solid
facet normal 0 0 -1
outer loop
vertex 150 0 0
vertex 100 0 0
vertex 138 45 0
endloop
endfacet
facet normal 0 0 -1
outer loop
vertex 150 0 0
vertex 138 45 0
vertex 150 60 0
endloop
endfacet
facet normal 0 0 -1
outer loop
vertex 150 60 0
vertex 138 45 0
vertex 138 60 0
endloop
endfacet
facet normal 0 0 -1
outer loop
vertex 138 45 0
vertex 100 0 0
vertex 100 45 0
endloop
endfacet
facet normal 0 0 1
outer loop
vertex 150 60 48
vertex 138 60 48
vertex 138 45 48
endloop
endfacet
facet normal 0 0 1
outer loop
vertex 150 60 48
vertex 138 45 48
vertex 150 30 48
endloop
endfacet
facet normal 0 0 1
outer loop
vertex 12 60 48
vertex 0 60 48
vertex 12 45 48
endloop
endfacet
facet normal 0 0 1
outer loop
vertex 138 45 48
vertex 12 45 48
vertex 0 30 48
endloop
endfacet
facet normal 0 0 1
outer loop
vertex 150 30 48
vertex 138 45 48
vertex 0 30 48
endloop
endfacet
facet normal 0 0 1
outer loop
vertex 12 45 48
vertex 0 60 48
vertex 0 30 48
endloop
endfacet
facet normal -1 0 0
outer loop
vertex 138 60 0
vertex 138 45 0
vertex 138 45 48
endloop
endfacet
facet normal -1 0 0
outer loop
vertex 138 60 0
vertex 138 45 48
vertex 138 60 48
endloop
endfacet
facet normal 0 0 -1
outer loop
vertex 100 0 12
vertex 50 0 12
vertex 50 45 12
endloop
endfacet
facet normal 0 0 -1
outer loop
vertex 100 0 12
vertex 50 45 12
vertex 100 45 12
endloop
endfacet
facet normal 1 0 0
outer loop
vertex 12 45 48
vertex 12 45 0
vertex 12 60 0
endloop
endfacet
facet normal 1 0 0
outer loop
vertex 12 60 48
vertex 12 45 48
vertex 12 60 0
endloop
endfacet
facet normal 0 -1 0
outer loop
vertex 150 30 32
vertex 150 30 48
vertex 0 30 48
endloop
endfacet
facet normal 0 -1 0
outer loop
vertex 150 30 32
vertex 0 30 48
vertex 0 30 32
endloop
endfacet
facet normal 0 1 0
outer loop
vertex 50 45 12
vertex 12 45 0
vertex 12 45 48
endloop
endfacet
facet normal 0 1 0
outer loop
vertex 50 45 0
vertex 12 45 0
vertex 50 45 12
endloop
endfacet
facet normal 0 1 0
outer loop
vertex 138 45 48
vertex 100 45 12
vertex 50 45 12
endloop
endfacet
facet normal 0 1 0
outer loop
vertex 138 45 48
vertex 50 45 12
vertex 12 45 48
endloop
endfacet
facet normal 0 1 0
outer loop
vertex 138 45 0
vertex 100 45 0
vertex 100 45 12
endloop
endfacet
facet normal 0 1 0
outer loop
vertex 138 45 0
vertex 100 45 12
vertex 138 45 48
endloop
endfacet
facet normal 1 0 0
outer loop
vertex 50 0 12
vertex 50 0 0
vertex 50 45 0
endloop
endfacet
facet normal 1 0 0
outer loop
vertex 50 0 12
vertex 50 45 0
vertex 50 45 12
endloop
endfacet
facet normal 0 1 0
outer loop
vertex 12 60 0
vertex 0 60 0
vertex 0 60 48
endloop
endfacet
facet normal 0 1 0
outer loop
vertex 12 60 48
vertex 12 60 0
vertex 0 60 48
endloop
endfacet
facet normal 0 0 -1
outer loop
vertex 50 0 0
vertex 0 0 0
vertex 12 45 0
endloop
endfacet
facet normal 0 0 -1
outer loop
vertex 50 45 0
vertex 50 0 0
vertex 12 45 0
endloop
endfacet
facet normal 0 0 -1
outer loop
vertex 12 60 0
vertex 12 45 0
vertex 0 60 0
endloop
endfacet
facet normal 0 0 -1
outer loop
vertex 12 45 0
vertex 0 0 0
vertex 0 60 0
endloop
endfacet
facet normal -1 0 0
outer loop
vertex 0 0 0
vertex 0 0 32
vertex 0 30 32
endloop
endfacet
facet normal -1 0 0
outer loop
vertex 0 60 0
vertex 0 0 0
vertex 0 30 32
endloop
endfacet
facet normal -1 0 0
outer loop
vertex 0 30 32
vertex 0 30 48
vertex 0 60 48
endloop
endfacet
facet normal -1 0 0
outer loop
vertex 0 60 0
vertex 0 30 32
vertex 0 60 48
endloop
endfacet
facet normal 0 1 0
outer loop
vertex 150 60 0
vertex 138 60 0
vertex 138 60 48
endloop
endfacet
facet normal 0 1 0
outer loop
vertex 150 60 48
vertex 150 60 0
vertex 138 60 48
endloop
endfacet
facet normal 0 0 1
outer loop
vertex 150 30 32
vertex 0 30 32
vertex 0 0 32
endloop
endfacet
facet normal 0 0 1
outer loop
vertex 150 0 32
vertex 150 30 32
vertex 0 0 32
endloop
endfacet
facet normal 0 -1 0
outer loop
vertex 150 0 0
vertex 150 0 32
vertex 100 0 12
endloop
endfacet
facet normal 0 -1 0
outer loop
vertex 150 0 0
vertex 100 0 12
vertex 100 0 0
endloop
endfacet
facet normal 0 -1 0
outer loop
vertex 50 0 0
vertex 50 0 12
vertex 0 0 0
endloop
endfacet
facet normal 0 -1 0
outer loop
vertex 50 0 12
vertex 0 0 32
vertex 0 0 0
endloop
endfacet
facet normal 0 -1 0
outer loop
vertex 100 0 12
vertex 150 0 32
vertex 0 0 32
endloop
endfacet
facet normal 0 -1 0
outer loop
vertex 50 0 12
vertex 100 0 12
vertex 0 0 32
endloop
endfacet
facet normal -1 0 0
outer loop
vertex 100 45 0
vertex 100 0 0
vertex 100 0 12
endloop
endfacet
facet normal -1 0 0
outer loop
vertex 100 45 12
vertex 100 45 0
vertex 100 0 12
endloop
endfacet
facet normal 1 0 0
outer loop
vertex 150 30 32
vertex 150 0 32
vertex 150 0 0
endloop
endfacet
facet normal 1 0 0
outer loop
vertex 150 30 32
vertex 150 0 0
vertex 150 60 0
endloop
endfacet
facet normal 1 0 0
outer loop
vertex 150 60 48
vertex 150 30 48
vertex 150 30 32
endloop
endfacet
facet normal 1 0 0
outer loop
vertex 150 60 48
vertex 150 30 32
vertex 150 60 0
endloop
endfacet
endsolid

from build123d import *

# Parameters (mm, degrees)
F1_DEPTH = 150
F2_W     = 50
F2_H     = 12
F3_DEPTH = 60
F4_W     = 126
F4_H     = 15.081386
F5_DEPTH = 48


with BuildPart() as f1:
    # F0 (on Right) → F1 (new body)
    with BuildSketch(Plane.YZ):
        Polygon((0, 32), (0, 0), (60, 0), (60, 48), (30, 48), (30, 32), align=None)
    extrude(amount=F1_DEPTH)

    # F2 (on Front) → F3 (cut)
    with BuildSketch(Plane.XZ):
        with Locations((75, 6)):
            Rectangle(F2_W, F2_H)
    extrude(amount=-F3_DEPTH, mode=Mode.SUBTRACT)

    # F4 (on Top) → F5 (cut)
    with BuildSketch(Plane.XY):
        with Locations((75, 52.540693)):
            Rectangle(F4_W, F4_H)
    extrude(amount=F5_DEPTH, mode=Mode.SUBTRACT)


solid = f1.part
